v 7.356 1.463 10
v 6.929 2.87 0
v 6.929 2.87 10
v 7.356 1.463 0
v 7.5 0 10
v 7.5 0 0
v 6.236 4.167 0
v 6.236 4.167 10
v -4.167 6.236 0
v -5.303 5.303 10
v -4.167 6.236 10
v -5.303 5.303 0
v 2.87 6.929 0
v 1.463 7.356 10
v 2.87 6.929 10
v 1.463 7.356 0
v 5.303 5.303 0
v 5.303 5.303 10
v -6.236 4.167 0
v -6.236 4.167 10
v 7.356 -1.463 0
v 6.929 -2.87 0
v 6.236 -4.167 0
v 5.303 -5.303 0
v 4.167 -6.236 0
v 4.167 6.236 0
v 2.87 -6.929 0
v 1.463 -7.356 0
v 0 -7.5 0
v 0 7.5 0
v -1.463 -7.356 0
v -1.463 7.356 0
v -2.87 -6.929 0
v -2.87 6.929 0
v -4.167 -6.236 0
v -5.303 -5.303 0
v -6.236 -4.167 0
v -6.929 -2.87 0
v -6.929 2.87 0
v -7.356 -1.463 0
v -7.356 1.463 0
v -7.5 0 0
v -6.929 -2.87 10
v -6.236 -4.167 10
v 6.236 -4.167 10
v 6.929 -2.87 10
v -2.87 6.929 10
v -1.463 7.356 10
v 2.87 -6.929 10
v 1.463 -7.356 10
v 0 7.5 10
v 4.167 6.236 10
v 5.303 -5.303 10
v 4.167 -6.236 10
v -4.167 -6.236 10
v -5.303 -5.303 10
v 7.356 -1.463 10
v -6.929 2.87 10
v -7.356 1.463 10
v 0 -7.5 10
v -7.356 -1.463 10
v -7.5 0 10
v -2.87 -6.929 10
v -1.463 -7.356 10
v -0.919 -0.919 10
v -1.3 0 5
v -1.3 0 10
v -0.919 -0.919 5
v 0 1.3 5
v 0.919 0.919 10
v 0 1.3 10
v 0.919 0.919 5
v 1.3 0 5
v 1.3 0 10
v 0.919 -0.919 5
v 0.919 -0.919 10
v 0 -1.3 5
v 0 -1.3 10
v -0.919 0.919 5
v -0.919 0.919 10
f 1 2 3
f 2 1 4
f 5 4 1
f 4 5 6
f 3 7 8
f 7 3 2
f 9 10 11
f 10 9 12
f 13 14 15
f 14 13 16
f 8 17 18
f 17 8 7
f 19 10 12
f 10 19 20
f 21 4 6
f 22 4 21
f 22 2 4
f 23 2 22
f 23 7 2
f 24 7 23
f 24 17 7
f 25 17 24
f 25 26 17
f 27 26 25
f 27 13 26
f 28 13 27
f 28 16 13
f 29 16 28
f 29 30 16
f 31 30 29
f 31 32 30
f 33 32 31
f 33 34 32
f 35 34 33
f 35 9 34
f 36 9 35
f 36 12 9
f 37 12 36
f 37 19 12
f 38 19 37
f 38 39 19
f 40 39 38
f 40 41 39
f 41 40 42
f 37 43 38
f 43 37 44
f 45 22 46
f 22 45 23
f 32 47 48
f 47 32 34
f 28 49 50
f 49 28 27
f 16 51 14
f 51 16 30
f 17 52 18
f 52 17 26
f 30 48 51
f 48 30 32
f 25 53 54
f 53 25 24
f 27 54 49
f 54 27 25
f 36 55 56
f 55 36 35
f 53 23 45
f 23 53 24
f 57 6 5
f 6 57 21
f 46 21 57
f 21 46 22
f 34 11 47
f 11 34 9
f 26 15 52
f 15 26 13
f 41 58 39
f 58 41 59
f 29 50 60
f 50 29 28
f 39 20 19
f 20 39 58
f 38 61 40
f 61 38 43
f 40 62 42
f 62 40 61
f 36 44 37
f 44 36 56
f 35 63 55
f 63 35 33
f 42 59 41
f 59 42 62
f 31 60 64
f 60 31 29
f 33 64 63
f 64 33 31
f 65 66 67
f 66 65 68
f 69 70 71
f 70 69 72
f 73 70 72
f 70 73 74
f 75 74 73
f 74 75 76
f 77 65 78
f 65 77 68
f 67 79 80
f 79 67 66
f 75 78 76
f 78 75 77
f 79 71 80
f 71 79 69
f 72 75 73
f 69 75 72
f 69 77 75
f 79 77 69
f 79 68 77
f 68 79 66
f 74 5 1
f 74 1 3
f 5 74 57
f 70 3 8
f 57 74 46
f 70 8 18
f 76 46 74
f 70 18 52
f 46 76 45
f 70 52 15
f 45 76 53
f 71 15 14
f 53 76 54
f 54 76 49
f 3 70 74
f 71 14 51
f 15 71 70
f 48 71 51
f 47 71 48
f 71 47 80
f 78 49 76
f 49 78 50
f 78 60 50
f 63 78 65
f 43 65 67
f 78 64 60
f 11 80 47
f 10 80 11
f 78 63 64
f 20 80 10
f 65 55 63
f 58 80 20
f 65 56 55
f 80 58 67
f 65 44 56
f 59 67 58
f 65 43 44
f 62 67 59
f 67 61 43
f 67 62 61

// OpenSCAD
difference() {
  cylinder(50, 7.5, 7.5, $fn = 32);
  
  translate([0, 0, 5])
    cylinder(50, 1.3, 1.3, $fn = 8);
  
  for (i = [0 : 1 : 8]) {
  *  rotate([0, -2.5, i * 45])
      translate([9, 0, 30]) {
          cylinder(20, 3, 4.5, $fn = 16);
      }
      
   *  rotate([0, 0, i * 45])
      translate([8, 0, -2.5]) {
          cylinder(55, 2, 3.5, $fn = 8);
      }   
  }
  
  translate([0, 0, 35])
  cube([40, 40, 50], center = true);
}
